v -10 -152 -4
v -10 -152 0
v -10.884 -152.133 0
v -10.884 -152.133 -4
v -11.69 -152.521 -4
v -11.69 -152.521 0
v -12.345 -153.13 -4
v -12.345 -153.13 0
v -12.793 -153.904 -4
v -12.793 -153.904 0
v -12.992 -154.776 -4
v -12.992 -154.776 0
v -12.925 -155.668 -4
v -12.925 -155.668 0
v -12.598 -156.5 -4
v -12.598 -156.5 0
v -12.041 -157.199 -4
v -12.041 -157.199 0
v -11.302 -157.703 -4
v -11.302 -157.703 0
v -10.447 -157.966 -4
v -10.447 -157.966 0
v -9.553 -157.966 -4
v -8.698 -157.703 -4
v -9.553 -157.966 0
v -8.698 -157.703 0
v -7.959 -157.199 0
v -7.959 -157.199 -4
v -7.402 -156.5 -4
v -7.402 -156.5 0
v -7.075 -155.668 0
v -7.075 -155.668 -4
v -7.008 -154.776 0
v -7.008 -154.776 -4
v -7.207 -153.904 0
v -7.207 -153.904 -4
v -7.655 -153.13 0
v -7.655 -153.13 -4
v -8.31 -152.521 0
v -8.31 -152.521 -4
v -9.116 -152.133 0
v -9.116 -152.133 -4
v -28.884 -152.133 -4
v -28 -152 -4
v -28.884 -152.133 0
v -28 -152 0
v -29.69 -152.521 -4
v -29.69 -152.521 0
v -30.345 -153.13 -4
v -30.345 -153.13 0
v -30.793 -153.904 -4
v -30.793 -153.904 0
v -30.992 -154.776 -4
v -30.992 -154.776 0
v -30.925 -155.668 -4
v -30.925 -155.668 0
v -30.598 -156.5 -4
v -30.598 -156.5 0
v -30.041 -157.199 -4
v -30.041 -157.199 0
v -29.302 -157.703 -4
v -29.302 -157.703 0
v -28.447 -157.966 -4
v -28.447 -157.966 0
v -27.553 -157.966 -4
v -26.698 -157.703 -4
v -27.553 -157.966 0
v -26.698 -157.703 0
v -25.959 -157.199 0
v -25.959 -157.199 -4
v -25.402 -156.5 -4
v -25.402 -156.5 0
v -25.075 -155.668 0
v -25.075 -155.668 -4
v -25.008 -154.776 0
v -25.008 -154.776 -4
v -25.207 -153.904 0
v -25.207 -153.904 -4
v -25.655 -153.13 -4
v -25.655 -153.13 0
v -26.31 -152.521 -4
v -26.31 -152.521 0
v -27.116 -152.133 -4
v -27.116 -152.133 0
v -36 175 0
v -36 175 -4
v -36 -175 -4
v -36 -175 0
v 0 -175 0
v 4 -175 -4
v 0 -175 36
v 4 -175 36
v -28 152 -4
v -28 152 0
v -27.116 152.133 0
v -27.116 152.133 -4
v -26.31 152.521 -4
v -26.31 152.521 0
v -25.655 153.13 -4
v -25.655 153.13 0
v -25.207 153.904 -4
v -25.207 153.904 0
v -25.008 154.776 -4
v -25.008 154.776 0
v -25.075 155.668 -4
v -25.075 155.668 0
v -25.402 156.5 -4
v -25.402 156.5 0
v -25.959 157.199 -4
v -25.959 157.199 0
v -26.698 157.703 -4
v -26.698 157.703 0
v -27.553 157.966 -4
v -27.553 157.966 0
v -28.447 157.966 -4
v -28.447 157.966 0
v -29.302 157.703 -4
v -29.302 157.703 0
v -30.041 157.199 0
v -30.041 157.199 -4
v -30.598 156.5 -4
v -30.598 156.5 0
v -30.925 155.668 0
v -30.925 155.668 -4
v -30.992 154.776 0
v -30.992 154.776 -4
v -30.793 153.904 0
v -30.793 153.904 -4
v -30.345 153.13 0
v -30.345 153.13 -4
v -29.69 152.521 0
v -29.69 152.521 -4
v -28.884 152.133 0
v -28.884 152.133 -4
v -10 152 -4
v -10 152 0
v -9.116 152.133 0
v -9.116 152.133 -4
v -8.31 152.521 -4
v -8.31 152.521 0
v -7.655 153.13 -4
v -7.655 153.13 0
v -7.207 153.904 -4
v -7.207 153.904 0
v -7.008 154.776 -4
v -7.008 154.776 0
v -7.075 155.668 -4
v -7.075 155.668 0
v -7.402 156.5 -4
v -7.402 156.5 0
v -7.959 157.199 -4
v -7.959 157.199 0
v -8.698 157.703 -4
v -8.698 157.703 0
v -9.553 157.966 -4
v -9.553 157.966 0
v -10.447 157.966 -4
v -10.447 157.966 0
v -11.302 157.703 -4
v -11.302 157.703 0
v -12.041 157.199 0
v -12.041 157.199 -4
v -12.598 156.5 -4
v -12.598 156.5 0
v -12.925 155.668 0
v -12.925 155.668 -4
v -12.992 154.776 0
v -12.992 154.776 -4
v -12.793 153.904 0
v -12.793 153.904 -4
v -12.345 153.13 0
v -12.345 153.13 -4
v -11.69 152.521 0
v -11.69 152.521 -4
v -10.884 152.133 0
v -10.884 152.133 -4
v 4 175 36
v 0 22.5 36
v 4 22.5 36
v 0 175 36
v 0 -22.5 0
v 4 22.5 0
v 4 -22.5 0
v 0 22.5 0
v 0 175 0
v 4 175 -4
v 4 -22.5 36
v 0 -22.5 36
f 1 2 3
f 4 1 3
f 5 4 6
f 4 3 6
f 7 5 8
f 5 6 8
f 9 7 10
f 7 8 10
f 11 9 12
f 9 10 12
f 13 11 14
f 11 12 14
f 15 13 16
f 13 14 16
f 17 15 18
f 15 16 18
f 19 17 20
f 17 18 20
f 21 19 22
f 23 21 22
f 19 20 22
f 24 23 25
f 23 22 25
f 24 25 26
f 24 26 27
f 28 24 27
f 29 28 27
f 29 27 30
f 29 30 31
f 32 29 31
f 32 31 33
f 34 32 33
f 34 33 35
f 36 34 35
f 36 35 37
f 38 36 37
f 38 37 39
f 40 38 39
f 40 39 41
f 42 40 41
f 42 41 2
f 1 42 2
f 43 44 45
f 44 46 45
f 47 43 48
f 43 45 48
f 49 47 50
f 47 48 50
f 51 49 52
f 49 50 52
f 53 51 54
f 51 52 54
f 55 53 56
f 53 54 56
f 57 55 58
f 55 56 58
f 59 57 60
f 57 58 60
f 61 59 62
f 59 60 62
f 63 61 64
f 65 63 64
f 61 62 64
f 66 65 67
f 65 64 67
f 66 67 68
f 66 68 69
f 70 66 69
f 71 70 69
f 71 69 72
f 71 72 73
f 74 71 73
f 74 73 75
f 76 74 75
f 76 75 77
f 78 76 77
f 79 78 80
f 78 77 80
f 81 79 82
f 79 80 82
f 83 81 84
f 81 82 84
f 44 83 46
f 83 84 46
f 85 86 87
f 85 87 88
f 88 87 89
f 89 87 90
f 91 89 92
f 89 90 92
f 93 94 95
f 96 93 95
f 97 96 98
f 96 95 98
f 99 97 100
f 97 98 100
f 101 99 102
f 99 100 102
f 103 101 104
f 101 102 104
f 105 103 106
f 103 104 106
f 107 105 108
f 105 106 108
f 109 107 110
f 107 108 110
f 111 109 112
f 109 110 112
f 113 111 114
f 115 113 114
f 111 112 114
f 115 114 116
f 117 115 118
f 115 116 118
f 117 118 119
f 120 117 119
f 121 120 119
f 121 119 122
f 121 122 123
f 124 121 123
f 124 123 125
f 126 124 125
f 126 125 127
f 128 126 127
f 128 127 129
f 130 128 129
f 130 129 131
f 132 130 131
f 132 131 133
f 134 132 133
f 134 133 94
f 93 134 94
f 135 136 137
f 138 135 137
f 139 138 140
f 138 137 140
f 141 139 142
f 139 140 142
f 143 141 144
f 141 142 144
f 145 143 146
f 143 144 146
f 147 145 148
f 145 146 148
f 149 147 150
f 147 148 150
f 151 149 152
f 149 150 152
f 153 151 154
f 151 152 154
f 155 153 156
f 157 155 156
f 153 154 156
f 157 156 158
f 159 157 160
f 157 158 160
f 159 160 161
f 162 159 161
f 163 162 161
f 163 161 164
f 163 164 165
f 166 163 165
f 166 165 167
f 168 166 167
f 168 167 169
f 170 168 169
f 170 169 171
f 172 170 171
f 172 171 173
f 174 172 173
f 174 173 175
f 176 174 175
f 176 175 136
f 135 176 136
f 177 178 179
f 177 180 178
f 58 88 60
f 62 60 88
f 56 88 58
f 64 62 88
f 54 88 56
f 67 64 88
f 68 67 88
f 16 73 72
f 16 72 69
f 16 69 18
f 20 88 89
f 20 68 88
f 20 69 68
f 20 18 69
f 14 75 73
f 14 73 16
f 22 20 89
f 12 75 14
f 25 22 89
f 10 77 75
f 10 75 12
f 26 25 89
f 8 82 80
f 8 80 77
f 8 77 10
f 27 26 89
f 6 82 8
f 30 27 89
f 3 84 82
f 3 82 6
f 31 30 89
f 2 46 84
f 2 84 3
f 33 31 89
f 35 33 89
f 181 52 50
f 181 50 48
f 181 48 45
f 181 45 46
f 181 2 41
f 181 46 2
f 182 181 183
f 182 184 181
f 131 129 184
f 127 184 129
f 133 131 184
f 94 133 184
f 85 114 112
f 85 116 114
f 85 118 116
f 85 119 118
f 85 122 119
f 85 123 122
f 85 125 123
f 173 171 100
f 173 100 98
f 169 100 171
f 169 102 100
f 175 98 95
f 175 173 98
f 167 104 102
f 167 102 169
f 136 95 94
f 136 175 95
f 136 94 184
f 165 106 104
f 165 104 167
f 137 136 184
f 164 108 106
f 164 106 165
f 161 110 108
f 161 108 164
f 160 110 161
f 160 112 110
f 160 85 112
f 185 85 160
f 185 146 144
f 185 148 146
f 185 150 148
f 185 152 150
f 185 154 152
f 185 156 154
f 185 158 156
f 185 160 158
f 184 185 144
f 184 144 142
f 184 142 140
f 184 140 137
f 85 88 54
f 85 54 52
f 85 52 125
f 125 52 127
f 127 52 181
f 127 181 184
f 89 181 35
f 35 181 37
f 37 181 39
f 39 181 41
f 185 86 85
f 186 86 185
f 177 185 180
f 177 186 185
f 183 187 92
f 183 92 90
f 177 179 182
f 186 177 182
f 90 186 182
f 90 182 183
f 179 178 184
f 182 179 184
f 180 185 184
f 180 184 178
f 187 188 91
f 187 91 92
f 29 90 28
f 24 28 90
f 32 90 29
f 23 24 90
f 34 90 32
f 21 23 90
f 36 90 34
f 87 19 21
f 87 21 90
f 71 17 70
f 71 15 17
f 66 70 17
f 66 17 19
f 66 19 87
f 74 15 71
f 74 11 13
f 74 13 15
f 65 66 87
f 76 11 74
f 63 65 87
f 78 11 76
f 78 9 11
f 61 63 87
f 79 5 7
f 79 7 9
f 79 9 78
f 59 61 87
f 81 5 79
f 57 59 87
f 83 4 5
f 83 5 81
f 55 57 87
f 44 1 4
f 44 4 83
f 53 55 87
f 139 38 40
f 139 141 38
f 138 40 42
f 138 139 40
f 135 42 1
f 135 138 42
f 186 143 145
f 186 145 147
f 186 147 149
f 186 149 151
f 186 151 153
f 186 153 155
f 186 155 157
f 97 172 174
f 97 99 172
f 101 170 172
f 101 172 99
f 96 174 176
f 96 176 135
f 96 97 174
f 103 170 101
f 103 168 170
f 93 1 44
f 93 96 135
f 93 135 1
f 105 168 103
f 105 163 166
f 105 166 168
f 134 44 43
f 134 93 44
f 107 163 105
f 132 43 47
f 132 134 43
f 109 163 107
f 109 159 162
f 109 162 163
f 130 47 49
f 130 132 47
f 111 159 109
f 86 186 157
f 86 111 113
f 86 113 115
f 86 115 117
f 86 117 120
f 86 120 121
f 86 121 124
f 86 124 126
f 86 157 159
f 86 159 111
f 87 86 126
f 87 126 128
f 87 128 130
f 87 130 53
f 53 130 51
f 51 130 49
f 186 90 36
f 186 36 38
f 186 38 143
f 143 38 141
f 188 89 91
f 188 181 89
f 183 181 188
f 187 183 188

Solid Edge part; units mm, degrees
sketch "Sketch1" plane through (0, 0, 0) normal (0, -1, 0) x (1, 0, 0)
  line L0 (-36, 0) -> (0, 0)
  line L1 (0, 0) -> (0, 36)
  line L2 (0, 36) -> (4, 36)
  line L3 (4, 36) -> (4, -4)
  line L4 (4, -4) -> (-36, -4)
  line L5 (-36, -4) -> (-36, 0)
  dimension "D1" = 36
  dimension "D2" = 4
extrude "Protrusion1" add sketch "Sketch1" along normal mid plane 350
sketch "Sketch2" plane through (-18, 0, 0) normal (0, 0, 1) x (0, -1, 0)
  circle A0 centre (-155, 8) radius 3
  circle A1 centre (-155, -10) radius 3
  dimension "D1" = 20
  dimension "D2" = 6
  dimension "D3" = 18
  dimension "D4" = 10
extrude "Cutout1" cut sketch "Sketch2" against normal through all
mirror "Mirror1" about plane through (0, 0, 0) normal (0, -1, 0) of "Cutout1"
sketch "Sketch3" plane through (0, 0, 18) normal (-1, 0, 0) x (0, -1, 0)
  line L0 (-22.5, -18) -> (22.5, -18)
  line L1 (22.5, -18) -> (22.5, 18)
  line L2 (22.5, 18) -> (-22.5, 18)
  line L3 (-22.5, 18) -> (-22.5, -18)
  dimension "D1" = 45
extrude "Cutout2" cut sketch "Sketch3" against normal through all
properties material "AlSi7Mg"
